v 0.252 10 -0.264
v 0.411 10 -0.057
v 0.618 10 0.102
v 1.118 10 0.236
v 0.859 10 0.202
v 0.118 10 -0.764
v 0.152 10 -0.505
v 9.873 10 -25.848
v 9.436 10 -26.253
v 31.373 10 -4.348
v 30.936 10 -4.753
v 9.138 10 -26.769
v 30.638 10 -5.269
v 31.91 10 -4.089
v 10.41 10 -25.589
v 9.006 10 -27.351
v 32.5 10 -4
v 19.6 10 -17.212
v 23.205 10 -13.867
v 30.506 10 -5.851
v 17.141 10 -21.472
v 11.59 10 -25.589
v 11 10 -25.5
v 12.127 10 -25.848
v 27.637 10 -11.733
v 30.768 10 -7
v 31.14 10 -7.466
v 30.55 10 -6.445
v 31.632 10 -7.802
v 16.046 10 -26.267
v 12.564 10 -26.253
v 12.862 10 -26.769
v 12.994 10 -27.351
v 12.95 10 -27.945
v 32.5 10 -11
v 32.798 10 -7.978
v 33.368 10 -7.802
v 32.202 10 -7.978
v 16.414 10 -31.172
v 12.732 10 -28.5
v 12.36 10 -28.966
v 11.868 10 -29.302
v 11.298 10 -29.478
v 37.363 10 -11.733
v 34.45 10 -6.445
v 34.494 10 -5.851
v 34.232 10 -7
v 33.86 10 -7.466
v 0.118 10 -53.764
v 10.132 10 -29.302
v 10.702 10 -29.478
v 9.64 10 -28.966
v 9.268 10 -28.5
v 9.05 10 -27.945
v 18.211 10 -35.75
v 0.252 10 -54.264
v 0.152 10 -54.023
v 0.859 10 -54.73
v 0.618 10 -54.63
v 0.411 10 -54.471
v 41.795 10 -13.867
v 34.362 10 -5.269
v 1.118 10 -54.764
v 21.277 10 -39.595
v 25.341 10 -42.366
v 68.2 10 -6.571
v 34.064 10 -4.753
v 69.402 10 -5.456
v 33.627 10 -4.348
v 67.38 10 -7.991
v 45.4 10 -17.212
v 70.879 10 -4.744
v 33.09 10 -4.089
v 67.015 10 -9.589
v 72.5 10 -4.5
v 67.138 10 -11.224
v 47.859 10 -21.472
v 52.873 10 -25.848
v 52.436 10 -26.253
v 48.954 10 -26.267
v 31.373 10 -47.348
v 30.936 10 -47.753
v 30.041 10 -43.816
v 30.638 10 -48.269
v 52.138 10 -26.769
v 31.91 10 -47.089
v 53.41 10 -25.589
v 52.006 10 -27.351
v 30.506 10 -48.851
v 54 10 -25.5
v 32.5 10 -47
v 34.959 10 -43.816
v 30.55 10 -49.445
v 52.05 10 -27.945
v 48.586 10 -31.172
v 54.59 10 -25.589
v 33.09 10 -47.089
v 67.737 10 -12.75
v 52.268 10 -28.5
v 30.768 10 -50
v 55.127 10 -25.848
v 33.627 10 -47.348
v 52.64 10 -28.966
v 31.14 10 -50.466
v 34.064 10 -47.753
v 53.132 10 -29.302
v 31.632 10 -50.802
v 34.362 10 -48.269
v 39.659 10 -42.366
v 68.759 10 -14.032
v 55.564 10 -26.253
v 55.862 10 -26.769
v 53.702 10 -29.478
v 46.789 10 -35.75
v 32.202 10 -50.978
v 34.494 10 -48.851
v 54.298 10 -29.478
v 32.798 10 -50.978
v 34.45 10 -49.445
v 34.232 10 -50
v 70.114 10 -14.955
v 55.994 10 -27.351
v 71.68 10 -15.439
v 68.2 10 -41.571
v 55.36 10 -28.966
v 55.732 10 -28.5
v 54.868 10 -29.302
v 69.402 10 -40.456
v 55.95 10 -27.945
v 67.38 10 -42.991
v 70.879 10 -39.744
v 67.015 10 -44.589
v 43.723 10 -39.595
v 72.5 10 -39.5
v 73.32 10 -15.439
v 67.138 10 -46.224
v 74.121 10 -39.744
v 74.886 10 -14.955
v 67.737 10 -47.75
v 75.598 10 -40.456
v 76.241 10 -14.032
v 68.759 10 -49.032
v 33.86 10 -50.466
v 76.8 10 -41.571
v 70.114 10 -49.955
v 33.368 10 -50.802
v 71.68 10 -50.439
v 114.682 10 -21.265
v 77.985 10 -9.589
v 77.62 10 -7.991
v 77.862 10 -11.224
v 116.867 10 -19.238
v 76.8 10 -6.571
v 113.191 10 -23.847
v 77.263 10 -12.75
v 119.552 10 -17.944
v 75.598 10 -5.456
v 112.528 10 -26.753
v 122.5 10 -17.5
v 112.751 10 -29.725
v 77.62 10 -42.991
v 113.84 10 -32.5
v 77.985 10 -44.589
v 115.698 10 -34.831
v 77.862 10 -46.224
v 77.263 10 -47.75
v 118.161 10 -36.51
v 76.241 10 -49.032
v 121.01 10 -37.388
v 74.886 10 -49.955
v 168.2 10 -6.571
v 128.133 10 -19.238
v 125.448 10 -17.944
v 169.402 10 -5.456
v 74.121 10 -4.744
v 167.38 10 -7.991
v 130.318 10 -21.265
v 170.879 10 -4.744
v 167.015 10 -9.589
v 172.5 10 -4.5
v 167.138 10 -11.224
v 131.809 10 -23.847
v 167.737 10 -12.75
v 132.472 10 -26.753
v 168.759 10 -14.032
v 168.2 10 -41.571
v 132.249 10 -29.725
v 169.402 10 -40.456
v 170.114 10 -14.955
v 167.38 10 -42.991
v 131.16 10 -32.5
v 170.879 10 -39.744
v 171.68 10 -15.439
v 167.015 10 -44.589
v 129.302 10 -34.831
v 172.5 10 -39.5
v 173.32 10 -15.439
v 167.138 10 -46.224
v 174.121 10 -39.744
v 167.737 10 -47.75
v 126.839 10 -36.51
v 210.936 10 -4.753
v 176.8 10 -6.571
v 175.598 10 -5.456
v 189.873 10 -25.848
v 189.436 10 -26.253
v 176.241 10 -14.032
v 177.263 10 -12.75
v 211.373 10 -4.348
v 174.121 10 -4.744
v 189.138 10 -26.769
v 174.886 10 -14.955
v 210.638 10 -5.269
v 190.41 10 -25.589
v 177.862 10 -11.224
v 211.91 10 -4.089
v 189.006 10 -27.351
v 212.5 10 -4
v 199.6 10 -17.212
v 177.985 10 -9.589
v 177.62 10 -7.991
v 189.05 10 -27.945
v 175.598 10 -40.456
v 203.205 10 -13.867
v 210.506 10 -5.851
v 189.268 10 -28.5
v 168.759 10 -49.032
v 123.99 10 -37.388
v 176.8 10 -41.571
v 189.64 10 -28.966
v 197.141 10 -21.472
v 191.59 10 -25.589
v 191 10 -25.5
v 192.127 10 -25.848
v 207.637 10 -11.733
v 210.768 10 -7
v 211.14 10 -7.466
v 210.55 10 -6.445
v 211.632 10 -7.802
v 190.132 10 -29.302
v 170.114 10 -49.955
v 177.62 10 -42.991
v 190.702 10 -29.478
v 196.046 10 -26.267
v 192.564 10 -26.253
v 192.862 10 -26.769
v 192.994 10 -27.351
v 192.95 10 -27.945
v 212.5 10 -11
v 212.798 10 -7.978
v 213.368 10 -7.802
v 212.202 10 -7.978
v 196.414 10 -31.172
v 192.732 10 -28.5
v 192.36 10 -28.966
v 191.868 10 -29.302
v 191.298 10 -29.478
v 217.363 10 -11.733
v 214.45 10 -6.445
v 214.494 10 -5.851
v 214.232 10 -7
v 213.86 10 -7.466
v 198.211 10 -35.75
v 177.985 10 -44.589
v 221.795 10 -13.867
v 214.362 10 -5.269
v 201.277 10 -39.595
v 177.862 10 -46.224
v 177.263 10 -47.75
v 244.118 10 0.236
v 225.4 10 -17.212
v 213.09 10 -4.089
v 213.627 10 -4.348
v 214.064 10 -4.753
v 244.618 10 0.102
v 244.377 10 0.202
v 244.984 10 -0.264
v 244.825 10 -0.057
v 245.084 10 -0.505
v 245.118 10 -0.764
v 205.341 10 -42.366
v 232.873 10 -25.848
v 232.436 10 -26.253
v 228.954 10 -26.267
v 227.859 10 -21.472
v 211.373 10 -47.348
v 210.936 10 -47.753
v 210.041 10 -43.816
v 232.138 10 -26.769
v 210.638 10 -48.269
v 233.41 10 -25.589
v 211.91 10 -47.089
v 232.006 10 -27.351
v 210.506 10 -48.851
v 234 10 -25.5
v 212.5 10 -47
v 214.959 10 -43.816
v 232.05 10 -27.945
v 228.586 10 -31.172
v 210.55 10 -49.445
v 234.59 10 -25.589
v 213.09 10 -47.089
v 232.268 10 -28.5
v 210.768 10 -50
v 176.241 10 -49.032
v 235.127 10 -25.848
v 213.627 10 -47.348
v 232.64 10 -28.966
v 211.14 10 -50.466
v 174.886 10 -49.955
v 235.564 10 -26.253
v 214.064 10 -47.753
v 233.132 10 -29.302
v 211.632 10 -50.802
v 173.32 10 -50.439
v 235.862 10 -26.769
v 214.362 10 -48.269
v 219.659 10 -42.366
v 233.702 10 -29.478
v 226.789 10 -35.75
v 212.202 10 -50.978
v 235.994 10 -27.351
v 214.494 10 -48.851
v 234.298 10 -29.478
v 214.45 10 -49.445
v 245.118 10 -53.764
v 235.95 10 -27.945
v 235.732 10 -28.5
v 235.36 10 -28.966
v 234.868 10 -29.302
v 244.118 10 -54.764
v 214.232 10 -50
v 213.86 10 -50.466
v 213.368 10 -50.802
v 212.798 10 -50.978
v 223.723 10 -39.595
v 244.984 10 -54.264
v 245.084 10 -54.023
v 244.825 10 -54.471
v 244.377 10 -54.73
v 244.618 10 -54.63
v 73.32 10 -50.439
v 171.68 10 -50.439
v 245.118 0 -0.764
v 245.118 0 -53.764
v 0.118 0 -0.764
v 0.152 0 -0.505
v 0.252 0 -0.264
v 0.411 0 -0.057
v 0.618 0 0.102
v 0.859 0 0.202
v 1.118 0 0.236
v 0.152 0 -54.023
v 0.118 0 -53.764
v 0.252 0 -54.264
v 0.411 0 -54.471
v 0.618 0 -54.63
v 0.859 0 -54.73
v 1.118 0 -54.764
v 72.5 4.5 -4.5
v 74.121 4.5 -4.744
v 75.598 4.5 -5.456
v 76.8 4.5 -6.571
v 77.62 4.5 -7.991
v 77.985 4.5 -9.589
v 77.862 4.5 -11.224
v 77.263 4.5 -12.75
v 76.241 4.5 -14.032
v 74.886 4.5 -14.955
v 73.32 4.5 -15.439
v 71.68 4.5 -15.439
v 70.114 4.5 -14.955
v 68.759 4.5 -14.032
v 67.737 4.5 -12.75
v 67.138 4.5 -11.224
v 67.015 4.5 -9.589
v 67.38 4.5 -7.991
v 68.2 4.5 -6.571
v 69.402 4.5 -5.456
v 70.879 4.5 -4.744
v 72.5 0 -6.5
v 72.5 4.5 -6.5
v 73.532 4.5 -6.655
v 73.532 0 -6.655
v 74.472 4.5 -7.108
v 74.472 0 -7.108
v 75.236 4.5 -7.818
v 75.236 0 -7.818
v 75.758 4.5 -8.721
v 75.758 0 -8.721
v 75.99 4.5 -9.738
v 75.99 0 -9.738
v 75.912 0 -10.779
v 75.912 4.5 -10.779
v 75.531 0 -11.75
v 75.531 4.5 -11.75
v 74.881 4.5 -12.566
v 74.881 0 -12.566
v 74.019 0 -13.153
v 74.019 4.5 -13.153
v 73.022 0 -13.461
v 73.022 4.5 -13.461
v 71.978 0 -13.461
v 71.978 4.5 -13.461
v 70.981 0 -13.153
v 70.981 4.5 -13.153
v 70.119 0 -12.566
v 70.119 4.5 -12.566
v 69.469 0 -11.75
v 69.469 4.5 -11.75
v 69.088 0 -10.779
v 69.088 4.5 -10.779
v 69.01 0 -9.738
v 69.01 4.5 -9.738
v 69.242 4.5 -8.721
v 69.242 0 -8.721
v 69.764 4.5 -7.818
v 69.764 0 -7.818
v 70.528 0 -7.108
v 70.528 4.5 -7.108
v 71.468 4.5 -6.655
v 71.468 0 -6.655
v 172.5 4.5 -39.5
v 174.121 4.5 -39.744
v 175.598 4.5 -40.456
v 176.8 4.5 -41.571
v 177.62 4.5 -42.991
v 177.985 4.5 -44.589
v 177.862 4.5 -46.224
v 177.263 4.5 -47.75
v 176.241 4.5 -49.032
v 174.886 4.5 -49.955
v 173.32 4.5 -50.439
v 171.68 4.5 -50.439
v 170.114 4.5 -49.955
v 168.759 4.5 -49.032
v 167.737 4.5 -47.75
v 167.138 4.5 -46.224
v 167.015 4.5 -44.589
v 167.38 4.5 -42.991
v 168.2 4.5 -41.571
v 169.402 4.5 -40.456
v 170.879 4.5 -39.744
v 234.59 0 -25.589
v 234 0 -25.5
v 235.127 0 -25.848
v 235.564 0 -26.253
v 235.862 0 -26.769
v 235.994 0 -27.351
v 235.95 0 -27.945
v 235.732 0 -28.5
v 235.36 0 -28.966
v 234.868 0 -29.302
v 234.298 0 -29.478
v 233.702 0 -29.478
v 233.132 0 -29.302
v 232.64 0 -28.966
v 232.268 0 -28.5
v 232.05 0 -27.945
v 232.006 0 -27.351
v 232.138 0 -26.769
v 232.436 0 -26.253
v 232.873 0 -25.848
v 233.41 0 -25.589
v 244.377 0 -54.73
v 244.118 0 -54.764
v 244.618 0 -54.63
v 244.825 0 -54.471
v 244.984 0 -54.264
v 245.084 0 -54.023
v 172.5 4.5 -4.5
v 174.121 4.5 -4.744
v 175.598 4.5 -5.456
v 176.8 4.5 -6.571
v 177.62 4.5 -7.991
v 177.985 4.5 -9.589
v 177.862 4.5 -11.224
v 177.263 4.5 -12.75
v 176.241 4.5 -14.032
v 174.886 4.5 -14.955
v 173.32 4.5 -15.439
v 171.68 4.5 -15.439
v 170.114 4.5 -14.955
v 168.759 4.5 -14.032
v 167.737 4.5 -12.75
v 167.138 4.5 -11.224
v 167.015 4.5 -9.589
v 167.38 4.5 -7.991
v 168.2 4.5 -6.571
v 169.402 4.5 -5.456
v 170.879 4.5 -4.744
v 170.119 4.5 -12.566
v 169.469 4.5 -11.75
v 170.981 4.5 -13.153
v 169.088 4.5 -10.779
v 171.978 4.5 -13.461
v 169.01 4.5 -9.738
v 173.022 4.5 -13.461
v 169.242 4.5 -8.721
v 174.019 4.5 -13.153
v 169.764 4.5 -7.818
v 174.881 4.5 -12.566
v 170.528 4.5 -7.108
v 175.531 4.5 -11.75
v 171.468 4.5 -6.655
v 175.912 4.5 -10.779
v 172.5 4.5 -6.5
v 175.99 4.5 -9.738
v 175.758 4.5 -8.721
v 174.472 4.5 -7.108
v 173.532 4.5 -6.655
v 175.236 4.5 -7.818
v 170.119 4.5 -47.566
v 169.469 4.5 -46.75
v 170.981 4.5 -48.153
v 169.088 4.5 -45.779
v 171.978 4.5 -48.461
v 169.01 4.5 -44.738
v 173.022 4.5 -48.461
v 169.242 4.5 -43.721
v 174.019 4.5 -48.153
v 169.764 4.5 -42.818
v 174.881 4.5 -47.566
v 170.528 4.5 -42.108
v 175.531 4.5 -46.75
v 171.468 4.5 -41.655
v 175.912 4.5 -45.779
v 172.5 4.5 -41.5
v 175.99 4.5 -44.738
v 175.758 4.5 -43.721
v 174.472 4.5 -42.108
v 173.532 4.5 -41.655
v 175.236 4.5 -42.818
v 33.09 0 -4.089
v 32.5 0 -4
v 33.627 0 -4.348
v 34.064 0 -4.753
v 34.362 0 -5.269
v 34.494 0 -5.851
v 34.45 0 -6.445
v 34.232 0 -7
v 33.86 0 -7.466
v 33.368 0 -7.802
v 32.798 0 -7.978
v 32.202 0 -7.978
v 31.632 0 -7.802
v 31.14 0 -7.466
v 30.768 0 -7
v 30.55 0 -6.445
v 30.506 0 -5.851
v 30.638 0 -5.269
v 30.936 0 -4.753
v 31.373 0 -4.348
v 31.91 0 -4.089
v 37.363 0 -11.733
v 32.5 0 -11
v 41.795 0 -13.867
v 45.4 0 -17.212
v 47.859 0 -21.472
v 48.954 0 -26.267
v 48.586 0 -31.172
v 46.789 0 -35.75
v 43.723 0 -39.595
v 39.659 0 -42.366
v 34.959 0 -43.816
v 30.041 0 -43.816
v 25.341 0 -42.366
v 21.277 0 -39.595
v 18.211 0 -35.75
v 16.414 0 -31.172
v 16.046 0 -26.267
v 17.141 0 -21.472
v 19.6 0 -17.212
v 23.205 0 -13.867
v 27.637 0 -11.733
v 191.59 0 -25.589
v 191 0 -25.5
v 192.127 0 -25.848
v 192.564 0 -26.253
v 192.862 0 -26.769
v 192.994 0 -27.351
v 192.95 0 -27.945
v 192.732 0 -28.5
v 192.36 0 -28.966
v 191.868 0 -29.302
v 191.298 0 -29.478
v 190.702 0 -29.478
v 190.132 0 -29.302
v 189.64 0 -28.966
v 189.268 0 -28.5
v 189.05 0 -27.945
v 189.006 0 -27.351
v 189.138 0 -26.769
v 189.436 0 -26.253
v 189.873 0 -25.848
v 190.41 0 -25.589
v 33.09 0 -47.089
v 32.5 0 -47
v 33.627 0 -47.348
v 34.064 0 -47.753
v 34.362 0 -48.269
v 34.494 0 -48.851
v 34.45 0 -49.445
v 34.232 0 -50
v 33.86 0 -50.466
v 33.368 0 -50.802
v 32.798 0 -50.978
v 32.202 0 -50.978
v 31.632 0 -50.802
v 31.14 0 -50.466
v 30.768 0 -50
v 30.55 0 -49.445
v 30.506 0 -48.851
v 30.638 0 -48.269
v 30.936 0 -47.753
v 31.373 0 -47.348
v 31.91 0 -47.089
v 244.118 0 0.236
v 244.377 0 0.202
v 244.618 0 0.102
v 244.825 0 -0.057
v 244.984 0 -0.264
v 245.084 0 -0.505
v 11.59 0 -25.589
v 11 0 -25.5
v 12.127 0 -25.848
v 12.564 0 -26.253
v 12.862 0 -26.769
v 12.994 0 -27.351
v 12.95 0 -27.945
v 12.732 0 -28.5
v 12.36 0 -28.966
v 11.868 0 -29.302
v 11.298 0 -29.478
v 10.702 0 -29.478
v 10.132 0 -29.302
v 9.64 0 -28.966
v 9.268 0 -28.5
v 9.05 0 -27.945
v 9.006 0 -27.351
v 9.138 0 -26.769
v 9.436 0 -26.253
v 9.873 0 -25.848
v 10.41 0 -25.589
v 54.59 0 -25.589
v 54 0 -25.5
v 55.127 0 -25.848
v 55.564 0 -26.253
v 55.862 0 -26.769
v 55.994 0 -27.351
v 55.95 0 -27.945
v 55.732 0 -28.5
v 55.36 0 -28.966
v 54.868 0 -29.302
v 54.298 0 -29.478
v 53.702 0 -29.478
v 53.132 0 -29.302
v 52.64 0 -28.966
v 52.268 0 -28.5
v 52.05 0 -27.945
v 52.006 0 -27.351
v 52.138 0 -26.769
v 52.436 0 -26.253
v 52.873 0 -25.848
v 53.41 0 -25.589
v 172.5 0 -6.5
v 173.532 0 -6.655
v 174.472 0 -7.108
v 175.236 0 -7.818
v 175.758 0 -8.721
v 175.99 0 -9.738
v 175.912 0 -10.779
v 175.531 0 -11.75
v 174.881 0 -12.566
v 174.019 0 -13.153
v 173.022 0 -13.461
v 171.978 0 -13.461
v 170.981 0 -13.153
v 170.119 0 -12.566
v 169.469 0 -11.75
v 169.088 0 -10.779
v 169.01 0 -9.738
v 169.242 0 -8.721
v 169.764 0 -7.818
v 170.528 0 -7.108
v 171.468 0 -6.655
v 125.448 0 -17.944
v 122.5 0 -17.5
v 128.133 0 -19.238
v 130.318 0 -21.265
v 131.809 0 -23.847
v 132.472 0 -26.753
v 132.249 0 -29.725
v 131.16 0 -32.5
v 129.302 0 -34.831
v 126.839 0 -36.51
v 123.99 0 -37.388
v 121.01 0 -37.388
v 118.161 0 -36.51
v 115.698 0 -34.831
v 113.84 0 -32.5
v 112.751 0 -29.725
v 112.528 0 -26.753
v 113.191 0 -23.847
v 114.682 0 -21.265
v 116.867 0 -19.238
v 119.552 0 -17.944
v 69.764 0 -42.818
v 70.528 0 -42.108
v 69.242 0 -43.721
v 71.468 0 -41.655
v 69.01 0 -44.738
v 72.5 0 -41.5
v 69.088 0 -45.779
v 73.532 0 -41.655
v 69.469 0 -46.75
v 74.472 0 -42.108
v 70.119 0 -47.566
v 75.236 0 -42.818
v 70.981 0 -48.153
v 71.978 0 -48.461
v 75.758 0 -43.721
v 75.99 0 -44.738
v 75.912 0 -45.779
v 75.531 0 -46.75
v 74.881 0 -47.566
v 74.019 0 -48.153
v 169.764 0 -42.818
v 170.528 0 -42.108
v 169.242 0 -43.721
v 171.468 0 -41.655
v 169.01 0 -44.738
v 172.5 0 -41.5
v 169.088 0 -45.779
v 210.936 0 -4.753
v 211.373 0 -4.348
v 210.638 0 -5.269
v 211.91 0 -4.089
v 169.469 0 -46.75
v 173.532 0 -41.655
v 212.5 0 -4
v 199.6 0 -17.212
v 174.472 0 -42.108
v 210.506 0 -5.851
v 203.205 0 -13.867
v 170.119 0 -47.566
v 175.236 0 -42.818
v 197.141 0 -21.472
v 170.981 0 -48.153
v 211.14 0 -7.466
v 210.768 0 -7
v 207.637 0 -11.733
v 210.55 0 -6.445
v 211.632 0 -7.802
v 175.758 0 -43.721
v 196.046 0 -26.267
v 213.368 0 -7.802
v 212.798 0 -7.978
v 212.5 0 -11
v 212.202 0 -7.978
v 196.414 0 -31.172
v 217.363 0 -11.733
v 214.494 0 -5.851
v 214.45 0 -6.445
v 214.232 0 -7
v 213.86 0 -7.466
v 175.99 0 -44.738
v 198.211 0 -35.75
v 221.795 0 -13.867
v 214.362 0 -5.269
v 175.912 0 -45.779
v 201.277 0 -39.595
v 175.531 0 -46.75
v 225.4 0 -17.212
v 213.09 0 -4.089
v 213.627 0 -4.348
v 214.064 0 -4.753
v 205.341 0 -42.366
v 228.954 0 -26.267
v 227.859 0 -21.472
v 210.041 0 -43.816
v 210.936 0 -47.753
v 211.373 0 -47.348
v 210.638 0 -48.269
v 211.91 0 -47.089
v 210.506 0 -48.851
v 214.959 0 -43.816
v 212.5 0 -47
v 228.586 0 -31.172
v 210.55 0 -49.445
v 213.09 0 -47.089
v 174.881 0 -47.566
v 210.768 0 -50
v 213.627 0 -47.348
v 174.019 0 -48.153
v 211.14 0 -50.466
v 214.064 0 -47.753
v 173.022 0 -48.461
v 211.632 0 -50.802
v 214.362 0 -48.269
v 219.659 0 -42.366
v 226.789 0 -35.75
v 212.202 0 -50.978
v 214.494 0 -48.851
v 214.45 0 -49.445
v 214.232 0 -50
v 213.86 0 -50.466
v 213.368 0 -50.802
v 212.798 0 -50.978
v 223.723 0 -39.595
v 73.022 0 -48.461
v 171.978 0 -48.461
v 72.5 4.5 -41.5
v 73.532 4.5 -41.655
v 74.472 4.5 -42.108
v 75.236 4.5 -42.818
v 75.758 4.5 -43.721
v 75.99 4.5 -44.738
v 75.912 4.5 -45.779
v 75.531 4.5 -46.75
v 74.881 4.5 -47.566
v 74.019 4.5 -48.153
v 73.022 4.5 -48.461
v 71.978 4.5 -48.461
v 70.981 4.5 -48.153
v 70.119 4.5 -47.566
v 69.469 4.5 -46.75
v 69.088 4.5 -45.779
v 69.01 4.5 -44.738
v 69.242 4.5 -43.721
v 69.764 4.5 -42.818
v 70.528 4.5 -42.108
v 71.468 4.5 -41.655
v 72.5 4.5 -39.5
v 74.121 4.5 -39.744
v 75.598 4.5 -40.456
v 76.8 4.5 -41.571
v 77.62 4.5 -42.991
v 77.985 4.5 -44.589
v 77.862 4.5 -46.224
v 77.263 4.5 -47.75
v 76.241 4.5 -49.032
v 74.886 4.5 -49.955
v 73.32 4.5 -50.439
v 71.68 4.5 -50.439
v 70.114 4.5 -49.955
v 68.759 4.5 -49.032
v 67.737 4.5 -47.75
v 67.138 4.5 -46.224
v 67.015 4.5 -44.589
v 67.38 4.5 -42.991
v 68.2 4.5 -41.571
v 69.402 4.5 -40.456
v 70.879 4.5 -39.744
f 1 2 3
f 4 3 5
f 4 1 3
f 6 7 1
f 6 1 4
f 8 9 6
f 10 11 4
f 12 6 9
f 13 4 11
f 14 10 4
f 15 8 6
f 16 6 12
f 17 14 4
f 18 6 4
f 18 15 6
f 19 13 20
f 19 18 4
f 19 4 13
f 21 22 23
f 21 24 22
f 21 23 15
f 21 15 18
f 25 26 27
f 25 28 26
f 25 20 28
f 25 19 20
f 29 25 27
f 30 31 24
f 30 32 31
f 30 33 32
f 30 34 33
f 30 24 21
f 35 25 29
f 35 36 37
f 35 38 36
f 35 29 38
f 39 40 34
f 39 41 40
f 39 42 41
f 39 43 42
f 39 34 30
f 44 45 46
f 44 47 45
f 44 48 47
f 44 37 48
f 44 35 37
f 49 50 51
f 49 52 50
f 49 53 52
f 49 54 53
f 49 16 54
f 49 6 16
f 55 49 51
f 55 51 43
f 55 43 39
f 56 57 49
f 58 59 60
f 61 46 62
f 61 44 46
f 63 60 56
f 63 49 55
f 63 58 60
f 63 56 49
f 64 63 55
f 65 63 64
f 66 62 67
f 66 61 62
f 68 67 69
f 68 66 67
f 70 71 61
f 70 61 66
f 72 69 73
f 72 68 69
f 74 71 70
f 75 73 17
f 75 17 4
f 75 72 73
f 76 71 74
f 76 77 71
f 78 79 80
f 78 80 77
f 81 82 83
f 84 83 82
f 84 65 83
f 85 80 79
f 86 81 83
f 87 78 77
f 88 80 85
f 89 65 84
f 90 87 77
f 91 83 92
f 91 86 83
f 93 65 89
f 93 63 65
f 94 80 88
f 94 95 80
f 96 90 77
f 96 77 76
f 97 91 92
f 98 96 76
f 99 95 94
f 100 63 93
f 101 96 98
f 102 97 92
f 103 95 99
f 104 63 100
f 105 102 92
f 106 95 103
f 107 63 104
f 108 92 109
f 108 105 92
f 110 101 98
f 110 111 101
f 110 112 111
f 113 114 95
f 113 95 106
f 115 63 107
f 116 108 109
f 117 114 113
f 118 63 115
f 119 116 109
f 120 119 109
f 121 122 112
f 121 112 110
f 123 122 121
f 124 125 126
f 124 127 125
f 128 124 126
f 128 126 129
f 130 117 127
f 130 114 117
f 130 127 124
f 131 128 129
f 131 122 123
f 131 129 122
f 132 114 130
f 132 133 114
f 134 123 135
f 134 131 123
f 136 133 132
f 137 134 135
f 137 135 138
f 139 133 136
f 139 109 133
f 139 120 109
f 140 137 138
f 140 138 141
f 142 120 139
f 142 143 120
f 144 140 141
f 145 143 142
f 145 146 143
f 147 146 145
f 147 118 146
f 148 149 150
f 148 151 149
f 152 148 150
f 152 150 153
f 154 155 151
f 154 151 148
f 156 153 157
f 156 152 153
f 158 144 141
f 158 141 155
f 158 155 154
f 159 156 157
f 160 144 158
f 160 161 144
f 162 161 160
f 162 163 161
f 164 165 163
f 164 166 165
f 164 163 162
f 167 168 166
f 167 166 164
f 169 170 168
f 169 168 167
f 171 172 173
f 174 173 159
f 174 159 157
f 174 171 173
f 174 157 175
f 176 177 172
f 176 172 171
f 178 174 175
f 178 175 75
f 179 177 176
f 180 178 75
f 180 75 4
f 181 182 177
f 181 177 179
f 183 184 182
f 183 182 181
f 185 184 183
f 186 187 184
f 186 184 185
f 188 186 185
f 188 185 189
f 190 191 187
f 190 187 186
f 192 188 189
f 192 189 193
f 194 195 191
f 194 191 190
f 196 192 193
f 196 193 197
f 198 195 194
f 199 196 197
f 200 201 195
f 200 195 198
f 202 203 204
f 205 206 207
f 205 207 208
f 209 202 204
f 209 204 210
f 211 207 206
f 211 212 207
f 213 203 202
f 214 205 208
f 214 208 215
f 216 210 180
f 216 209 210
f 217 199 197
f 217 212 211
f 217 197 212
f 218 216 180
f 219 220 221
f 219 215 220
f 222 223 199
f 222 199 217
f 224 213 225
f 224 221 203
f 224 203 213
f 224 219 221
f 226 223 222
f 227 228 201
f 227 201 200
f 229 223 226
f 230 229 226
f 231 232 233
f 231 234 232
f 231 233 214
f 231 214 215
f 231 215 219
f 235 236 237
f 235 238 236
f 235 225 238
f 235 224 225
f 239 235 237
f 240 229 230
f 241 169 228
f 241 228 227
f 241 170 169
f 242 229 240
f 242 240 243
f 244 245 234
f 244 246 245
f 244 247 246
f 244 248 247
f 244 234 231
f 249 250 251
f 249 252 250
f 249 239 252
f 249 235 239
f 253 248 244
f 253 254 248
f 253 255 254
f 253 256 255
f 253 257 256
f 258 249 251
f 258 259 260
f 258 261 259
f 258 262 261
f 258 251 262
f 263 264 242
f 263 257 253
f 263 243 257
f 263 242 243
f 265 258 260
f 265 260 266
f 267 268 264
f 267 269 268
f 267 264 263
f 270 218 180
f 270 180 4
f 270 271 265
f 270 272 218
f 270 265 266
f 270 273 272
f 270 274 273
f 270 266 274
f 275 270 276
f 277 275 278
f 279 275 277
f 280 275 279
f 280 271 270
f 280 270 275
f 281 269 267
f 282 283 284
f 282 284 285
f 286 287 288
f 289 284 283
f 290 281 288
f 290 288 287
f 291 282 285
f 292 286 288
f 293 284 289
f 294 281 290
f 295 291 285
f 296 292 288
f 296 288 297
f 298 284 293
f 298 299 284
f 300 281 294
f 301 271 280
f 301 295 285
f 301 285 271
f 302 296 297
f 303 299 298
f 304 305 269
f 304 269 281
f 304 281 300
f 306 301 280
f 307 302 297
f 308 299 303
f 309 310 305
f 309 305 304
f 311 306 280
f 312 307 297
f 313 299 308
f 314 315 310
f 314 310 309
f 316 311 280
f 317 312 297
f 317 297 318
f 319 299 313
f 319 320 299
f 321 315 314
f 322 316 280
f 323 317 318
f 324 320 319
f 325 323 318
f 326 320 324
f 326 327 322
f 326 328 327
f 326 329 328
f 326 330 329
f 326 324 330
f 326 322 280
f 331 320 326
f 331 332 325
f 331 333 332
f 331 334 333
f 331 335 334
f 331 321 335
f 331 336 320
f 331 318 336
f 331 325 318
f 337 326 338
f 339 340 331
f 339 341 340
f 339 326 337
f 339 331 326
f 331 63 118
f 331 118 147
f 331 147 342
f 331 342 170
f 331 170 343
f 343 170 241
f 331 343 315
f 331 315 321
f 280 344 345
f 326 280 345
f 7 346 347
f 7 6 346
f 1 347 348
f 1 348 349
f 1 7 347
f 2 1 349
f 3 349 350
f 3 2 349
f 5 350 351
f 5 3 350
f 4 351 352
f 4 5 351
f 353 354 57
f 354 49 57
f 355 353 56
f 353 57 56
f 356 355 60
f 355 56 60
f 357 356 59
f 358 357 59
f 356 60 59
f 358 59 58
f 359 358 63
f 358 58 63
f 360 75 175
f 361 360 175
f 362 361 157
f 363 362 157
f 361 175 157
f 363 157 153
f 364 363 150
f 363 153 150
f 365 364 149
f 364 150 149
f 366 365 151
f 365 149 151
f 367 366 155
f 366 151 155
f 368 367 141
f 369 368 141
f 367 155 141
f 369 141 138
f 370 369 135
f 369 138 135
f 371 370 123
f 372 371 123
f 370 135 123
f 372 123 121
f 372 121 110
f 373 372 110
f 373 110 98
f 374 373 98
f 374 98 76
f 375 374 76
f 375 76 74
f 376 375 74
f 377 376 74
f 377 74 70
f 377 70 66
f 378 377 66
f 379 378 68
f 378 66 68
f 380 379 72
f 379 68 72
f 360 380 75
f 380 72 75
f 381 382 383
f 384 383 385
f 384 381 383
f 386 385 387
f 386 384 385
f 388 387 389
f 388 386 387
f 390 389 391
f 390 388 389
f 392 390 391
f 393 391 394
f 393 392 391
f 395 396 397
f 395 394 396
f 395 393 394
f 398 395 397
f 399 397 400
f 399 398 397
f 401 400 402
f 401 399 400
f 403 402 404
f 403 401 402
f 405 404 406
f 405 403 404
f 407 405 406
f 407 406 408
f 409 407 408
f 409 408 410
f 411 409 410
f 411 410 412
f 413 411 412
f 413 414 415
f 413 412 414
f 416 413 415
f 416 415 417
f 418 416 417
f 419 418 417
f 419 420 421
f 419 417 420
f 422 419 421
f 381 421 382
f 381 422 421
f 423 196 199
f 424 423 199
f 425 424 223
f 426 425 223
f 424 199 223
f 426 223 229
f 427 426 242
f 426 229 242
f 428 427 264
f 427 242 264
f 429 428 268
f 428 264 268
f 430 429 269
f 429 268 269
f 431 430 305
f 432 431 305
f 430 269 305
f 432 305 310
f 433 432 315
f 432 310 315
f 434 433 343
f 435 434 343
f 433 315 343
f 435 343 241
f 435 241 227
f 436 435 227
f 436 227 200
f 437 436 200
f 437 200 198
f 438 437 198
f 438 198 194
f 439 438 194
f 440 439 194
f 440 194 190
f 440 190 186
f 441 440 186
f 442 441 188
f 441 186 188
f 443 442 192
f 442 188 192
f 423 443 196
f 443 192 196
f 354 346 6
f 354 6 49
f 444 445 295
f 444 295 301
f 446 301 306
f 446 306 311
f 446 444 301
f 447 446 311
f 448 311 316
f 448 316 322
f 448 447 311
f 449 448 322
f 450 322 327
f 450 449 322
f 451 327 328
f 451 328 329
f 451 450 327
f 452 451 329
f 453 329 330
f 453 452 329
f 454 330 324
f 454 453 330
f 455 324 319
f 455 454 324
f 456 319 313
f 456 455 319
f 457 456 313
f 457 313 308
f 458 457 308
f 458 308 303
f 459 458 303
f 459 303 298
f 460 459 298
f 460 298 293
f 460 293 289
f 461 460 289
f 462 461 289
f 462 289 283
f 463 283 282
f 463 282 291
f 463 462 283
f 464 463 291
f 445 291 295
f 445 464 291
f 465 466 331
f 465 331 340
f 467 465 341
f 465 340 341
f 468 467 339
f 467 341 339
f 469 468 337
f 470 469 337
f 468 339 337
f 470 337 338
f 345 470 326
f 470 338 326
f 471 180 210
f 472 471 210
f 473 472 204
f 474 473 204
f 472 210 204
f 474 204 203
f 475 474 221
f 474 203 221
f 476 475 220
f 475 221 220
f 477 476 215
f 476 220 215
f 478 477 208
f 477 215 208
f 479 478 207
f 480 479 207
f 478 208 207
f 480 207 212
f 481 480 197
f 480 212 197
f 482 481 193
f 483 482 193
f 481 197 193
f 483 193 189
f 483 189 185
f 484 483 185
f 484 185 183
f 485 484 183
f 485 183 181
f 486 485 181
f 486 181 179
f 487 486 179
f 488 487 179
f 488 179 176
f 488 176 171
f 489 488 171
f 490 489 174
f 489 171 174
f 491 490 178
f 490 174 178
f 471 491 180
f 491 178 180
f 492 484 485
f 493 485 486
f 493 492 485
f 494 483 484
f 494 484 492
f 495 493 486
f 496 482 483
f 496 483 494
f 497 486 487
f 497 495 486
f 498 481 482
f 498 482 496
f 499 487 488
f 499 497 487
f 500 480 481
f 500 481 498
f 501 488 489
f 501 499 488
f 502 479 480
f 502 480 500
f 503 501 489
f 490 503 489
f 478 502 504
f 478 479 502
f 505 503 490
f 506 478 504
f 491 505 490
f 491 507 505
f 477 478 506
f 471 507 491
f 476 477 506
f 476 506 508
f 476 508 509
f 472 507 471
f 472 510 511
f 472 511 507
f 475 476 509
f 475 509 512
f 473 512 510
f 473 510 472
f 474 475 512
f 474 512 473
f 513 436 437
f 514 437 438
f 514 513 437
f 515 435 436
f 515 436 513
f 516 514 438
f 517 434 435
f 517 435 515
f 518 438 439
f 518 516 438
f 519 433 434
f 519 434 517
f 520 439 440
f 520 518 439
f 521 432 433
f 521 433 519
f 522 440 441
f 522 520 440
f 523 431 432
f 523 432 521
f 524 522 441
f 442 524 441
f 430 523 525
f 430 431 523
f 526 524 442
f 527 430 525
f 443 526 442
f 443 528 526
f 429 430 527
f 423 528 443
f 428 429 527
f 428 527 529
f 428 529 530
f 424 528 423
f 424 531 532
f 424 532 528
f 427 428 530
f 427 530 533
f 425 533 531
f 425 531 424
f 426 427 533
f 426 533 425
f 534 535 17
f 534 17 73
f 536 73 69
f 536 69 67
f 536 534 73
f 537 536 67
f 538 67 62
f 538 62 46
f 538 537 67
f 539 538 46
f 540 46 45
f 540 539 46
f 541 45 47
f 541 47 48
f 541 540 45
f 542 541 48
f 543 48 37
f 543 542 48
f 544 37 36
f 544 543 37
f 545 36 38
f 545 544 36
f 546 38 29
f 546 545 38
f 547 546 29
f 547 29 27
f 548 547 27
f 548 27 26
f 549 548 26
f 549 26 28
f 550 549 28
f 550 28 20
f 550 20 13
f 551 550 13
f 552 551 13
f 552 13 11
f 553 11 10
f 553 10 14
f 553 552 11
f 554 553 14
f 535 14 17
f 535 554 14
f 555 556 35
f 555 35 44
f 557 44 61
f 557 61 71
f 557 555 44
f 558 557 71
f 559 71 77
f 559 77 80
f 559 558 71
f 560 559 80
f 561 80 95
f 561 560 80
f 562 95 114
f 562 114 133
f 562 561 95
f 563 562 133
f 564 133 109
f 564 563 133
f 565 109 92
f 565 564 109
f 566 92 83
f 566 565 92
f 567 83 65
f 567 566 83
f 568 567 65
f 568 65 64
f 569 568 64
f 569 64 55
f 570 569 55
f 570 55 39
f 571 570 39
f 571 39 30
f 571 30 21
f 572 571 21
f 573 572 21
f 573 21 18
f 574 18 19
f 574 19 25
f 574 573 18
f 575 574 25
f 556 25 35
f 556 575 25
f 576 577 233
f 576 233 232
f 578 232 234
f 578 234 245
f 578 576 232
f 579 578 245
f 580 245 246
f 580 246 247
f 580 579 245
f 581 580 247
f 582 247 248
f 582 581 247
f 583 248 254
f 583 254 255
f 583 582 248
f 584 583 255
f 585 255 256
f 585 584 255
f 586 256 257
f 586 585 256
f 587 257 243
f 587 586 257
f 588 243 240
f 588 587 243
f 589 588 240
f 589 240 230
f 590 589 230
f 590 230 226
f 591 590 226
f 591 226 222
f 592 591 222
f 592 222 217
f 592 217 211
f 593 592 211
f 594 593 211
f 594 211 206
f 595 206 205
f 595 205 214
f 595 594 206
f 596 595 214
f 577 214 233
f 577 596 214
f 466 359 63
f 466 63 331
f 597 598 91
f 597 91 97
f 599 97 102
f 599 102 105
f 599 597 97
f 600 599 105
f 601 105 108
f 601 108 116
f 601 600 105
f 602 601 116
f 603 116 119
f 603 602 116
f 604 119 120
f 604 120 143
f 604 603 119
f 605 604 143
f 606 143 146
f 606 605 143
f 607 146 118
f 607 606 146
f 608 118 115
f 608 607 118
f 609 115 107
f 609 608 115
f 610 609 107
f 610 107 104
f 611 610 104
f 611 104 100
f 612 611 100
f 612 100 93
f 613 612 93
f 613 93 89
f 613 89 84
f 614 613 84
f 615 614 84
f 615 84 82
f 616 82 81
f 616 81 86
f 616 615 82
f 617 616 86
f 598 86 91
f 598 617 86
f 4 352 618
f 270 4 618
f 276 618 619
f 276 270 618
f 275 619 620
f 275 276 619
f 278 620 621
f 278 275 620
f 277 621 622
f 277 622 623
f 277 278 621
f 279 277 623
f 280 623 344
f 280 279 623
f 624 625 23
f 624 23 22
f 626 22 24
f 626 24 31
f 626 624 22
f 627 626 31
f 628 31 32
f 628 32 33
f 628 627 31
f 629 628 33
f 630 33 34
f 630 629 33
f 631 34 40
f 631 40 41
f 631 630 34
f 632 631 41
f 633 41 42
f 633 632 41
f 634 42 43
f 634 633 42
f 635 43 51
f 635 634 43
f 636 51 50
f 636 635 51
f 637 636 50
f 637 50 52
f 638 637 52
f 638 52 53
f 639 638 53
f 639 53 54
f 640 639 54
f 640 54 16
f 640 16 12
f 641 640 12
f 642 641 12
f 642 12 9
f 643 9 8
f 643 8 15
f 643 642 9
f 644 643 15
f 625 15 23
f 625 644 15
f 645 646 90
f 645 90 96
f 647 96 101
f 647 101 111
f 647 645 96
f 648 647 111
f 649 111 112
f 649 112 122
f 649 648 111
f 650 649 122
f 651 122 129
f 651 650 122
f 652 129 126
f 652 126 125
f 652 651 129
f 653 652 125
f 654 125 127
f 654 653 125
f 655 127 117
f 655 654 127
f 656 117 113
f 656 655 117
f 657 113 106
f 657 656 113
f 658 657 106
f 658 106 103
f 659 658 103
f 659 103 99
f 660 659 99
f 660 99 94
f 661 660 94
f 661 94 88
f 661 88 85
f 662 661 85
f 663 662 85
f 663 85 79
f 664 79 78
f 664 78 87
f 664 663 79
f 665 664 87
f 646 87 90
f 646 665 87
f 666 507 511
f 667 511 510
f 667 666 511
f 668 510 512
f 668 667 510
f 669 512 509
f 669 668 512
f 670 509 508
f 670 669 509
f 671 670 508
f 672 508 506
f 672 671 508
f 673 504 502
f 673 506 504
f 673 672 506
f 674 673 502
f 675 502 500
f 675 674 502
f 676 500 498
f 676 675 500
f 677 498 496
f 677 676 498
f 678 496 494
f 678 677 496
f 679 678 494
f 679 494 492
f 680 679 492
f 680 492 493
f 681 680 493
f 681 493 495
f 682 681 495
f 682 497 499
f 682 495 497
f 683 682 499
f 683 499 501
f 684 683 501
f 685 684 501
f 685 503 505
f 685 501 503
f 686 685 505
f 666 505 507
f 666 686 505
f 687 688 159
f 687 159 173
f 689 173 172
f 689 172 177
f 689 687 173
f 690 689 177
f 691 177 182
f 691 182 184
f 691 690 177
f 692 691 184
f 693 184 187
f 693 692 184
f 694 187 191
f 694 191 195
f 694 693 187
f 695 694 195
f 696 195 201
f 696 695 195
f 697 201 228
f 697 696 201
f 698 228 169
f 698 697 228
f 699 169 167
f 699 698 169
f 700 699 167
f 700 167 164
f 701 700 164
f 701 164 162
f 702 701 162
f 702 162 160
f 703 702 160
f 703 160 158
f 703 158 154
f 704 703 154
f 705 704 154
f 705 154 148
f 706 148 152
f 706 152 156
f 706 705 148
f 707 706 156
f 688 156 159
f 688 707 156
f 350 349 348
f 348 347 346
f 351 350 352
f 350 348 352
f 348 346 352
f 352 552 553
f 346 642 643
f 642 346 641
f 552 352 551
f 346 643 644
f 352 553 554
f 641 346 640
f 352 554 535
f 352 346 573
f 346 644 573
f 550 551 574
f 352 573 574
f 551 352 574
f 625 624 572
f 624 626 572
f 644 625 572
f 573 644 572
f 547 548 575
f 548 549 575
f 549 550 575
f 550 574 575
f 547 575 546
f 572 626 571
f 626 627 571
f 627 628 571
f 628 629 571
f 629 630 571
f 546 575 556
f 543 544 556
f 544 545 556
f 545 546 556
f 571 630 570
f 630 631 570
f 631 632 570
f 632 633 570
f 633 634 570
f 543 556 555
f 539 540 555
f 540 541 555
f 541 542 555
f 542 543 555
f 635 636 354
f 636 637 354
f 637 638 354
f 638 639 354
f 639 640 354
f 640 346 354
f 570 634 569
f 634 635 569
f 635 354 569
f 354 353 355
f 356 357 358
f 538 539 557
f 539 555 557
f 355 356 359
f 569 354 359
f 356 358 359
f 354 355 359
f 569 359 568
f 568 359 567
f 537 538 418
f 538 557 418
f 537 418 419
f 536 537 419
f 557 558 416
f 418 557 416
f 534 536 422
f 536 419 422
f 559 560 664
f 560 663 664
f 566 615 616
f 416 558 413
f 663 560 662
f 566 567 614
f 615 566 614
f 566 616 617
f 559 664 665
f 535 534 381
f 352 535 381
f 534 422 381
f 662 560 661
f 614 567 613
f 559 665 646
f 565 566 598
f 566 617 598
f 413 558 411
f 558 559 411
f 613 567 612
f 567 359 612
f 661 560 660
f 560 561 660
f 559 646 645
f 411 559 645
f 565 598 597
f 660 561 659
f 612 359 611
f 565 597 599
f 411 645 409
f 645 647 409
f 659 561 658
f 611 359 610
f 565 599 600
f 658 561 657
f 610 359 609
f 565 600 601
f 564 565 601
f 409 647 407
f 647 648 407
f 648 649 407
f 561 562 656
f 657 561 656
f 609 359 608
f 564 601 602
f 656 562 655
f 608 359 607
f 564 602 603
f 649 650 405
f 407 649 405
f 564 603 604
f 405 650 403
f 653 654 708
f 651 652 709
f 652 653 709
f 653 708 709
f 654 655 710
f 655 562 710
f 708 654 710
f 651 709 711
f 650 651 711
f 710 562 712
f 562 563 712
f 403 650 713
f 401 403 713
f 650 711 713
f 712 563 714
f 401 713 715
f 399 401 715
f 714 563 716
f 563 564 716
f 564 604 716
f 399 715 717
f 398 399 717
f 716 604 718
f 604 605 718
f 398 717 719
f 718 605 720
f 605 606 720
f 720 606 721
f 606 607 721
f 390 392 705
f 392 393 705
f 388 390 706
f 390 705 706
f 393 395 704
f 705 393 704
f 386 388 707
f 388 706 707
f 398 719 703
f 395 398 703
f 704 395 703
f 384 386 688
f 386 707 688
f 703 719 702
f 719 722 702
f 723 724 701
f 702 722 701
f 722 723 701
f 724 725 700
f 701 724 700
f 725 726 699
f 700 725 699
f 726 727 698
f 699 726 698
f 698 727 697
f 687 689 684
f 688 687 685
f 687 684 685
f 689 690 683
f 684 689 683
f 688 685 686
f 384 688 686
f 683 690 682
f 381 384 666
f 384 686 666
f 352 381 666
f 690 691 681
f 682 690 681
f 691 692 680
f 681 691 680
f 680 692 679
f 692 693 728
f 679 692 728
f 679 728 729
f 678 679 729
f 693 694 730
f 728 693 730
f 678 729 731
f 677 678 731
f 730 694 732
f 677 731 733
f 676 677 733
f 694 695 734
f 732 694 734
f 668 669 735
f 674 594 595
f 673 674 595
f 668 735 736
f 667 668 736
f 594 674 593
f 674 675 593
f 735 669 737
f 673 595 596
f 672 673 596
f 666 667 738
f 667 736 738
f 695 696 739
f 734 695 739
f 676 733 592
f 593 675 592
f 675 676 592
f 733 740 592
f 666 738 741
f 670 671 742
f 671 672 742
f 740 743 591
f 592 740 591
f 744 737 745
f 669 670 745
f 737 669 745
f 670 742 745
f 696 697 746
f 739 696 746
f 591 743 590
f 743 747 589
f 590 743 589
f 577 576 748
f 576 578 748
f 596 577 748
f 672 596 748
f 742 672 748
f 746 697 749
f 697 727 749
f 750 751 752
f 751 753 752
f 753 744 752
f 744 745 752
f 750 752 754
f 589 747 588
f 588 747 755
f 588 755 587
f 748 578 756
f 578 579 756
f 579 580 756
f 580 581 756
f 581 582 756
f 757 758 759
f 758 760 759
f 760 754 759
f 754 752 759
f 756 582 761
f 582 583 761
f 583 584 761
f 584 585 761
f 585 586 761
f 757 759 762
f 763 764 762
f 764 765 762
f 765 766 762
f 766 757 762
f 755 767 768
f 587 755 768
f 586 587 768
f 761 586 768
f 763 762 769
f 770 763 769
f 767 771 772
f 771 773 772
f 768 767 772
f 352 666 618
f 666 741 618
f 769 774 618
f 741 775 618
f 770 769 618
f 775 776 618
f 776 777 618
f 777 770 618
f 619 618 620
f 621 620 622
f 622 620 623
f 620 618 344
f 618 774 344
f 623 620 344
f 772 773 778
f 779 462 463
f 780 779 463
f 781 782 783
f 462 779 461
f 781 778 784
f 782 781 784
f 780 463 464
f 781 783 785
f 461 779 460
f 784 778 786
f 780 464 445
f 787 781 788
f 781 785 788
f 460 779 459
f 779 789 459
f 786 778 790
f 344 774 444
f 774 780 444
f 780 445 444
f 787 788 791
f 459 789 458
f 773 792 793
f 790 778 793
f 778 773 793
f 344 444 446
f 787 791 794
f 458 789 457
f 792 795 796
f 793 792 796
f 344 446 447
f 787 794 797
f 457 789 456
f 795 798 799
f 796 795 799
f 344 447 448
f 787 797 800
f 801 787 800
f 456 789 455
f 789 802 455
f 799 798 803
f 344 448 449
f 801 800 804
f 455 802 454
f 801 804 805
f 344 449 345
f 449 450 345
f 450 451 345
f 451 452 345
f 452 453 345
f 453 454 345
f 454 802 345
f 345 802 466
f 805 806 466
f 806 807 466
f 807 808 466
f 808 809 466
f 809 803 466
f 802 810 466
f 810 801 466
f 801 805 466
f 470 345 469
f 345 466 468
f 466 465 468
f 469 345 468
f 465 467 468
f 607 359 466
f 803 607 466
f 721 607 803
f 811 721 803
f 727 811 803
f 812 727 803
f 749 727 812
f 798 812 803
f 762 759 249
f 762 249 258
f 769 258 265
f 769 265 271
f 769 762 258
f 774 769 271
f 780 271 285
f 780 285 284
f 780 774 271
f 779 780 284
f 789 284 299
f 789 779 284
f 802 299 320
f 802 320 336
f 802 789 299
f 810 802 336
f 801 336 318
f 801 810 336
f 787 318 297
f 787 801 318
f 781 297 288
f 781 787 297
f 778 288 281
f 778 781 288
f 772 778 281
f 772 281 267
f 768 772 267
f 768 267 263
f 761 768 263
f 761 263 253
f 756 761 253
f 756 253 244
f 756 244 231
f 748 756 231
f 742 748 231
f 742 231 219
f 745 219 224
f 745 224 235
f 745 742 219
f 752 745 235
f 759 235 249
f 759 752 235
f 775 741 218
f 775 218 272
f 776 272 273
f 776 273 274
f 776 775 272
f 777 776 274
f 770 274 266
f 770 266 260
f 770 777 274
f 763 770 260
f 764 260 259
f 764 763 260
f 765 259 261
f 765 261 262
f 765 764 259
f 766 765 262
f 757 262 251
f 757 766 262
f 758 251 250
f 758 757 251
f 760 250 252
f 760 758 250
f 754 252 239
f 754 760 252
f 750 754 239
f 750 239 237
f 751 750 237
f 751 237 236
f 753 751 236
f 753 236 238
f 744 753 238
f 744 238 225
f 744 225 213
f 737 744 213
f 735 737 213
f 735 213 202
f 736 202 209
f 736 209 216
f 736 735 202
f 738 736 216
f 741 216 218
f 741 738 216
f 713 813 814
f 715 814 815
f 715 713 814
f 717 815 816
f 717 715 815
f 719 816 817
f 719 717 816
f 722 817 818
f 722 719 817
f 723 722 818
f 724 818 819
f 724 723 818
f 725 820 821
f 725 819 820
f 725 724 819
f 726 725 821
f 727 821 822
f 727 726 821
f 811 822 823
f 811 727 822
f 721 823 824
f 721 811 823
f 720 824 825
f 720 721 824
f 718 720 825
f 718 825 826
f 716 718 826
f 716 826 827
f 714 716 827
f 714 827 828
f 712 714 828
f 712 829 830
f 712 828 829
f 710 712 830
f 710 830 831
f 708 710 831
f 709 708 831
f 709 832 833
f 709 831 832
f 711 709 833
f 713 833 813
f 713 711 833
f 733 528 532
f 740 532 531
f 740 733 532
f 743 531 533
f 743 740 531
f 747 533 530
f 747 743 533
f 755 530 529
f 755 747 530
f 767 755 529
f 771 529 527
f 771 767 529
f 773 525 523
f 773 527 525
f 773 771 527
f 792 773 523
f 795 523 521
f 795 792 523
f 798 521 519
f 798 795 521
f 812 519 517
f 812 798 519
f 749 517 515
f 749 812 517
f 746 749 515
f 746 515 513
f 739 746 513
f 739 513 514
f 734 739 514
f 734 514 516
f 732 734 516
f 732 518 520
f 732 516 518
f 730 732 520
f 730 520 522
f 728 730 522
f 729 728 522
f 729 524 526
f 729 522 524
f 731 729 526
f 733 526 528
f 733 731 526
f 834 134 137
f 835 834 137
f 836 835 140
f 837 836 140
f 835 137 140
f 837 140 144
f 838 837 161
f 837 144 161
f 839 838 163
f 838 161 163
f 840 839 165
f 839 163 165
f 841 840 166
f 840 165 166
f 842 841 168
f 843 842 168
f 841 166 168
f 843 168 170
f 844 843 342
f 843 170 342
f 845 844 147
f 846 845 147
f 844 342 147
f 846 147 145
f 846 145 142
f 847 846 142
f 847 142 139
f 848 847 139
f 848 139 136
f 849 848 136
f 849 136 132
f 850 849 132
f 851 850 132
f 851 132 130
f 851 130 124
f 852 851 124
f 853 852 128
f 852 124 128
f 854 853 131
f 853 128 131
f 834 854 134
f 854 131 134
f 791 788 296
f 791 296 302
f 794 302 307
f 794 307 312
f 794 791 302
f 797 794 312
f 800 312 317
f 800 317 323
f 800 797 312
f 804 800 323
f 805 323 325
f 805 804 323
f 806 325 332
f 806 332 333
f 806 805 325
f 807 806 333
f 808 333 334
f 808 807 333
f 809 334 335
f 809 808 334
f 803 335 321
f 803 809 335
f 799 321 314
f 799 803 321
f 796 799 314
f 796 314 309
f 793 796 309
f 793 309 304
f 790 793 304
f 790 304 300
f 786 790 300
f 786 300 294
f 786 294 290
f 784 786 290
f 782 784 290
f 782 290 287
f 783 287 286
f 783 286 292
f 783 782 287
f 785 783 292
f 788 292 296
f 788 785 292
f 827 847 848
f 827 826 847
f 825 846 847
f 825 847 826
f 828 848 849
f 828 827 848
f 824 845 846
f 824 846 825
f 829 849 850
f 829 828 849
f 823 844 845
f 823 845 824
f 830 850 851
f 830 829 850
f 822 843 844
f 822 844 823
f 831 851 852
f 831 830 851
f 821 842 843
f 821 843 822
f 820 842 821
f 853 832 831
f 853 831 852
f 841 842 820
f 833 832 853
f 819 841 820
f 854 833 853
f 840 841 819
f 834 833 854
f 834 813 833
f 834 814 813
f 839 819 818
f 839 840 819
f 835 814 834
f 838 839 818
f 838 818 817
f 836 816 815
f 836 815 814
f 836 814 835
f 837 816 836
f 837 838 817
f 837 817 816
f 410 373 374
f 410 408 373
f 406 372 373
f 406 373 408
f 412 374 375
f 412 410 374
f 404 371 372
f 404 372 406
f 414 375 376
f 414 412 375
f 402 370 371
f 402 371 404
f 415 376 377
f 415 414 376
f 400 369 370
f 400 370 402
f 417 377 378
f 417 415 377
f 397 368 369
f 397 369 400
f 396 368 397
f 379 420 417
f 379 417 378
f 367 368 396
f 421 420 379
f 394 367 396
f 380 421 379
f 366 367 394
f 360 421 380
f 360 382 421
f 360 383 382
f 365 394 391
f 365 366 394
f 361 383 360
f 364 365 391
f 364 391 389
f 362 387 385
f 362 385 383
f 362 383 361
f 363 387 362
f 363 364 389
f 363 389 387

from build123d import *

# Parameters (mm, degrees)
SKETCH_1_W          = 245
SKETCH_1_H          = 55
SKETCH_1_R          = 16.5
SKETCH_1_R_2        = 2
SKETCH_1_R_3        = 3.5
SKETCH_1_R_4        = 10
EXTRUDE_4_DEPTH     = 10
SKETCH_2_R          = 5.5
CUT_EXTRUDE_1_DEPTH = 5.5
FILLET_1_R          = 1


with BuildPart() as part:
    # 草图1 → 凸台-拉伸4 (new body)
    with BuildSketch(Plane(origin=(0, 0, 0), x_dir=(1, 0, 0), z_dir=(0, 1, 0))):
        with Locations((122.617986059, 27.264027881)):
            Rectangle(SKETCH_1_W, SKETCH_1_H)
        with Locations(Location((32.5, 27.5, 0), (0, 0, 270))):
            Circle(SKETCH_1_R, mode=Mode.SUBTRACT)
        with Locations(Location((11, 27.5, 0), (0, 0, 270))):
            Circle(SKETCH_1_R_2, mode=Mode.SUBTRACT)
        with Locations(Location((54, 27.5, 0), (0, 0, 270))):
            Circle(SKETCH_1_R_2, mode=Mode.SUBTRACT)
        with Locations(Location((32.5, 6, 0), (0, 0, 270))):
            Circle(SKETCH_1_R_2, mode=Mode.SUBTRACT)
        with Locations(Location((72.5, 10, 0), (0, 0, 270))):
            Circle(SKETCH_1_R_3, mode=Mode.SUBTRACT)
        with Locations(Location((72.5, 45, 0), (0, 0, 270))):
            Circle(SKETCH_1_R_3, mode=Mode.SUBTRACT)
        with Locations(Location((32.5, 49, 0), (0, 0, 270))):
            Circle(SKETCH_1_R_2, mode=Mode.SUBTRACT)
        with Locations(Location((212.5, 6, 0), (0, 0, 270))):
            Circle(SKETCH_1_R_2, mode=Mode.SUBTRACT)
        with Locations(Location((172.5, 10, 0), (0, 0, 270))):
            Circle(SKETCH_1_R_3, mode=Mode.SUBTRACT)
        with Locations(Location((234, 27.5, 0), (0, 0, 270))):
            Circle(SKETCH_1_R_2, mode=Mode.SUBTRACT)
        with Locations(Location((191, 27.5, 0), (0, 0, 270))):
            Circle(SKETCH_1_R_2, mode=Mode.SUBTRACT)
        with Locations(Location((172.5, 45, 0), (0, 0, 270))):
            Circle(SKETCH_1_R_3, mode=Mode.SUBTRACT)
        with Locations(Location((212.5, 49, 0), (0, 0, 270))):
            Circle(SKETCH_1_R_2, mode=Mode.SUBTRACT)
        with Locations(Location((212.5, 27.5, 0), (0, 0, 270))):
            Circle(SKETCH_1_R, mode=Mode.SUBTRACT)
        with Locations(Location((122.5, 27.5, 0), (0, 0, 270))):
            Circle(SKETCH_1_R_4, mode=Mode.SUBTRACT)
    extrude(amount=EXTRUDE_4_DEPTH)

    # 草图2 → 切除-拉伸1 (cut)
    with BuildSketch(Plane(origin=(0, 10, 0), x_dir=(1, 0, 0), z_dir=(0, 1, 0))):
        with Locations(Location((72.5, 45, 0), (0, 0, 270))):
            Circle(SKETCH_2_R)
        with Locations(Location((72.5, 10, 0), (0, 0, 270))):
            Circle(SKETCH_2_R)
        with Locations(Location((172.5, 45, 0), (0, 0, 270))):
            Circle(SKETCH_2_R)
        with Locations(Location((172.5, 10, 0), (0, 0, 270))):
            Circle(SKETCH_2_R)
    extrude(amount=-CUT_EXTRUDE_1_DEPTH, mode=Mode.SUBTRACT)

    # 圆角1
    fillet_1_edges = [part.edges().sort_by_distance(p)[0] for p in [
        (0.117986059, 5, -54.764027881),
        (0.117986059, 5, 0.235972119),
        (245.117986059, 5, 0.235972119),
        (245.117986059, 5, -54.764027881),
    ]]
    fillet(fillet_1_edges, radius=FILLET_1_R)


solid = part.part
